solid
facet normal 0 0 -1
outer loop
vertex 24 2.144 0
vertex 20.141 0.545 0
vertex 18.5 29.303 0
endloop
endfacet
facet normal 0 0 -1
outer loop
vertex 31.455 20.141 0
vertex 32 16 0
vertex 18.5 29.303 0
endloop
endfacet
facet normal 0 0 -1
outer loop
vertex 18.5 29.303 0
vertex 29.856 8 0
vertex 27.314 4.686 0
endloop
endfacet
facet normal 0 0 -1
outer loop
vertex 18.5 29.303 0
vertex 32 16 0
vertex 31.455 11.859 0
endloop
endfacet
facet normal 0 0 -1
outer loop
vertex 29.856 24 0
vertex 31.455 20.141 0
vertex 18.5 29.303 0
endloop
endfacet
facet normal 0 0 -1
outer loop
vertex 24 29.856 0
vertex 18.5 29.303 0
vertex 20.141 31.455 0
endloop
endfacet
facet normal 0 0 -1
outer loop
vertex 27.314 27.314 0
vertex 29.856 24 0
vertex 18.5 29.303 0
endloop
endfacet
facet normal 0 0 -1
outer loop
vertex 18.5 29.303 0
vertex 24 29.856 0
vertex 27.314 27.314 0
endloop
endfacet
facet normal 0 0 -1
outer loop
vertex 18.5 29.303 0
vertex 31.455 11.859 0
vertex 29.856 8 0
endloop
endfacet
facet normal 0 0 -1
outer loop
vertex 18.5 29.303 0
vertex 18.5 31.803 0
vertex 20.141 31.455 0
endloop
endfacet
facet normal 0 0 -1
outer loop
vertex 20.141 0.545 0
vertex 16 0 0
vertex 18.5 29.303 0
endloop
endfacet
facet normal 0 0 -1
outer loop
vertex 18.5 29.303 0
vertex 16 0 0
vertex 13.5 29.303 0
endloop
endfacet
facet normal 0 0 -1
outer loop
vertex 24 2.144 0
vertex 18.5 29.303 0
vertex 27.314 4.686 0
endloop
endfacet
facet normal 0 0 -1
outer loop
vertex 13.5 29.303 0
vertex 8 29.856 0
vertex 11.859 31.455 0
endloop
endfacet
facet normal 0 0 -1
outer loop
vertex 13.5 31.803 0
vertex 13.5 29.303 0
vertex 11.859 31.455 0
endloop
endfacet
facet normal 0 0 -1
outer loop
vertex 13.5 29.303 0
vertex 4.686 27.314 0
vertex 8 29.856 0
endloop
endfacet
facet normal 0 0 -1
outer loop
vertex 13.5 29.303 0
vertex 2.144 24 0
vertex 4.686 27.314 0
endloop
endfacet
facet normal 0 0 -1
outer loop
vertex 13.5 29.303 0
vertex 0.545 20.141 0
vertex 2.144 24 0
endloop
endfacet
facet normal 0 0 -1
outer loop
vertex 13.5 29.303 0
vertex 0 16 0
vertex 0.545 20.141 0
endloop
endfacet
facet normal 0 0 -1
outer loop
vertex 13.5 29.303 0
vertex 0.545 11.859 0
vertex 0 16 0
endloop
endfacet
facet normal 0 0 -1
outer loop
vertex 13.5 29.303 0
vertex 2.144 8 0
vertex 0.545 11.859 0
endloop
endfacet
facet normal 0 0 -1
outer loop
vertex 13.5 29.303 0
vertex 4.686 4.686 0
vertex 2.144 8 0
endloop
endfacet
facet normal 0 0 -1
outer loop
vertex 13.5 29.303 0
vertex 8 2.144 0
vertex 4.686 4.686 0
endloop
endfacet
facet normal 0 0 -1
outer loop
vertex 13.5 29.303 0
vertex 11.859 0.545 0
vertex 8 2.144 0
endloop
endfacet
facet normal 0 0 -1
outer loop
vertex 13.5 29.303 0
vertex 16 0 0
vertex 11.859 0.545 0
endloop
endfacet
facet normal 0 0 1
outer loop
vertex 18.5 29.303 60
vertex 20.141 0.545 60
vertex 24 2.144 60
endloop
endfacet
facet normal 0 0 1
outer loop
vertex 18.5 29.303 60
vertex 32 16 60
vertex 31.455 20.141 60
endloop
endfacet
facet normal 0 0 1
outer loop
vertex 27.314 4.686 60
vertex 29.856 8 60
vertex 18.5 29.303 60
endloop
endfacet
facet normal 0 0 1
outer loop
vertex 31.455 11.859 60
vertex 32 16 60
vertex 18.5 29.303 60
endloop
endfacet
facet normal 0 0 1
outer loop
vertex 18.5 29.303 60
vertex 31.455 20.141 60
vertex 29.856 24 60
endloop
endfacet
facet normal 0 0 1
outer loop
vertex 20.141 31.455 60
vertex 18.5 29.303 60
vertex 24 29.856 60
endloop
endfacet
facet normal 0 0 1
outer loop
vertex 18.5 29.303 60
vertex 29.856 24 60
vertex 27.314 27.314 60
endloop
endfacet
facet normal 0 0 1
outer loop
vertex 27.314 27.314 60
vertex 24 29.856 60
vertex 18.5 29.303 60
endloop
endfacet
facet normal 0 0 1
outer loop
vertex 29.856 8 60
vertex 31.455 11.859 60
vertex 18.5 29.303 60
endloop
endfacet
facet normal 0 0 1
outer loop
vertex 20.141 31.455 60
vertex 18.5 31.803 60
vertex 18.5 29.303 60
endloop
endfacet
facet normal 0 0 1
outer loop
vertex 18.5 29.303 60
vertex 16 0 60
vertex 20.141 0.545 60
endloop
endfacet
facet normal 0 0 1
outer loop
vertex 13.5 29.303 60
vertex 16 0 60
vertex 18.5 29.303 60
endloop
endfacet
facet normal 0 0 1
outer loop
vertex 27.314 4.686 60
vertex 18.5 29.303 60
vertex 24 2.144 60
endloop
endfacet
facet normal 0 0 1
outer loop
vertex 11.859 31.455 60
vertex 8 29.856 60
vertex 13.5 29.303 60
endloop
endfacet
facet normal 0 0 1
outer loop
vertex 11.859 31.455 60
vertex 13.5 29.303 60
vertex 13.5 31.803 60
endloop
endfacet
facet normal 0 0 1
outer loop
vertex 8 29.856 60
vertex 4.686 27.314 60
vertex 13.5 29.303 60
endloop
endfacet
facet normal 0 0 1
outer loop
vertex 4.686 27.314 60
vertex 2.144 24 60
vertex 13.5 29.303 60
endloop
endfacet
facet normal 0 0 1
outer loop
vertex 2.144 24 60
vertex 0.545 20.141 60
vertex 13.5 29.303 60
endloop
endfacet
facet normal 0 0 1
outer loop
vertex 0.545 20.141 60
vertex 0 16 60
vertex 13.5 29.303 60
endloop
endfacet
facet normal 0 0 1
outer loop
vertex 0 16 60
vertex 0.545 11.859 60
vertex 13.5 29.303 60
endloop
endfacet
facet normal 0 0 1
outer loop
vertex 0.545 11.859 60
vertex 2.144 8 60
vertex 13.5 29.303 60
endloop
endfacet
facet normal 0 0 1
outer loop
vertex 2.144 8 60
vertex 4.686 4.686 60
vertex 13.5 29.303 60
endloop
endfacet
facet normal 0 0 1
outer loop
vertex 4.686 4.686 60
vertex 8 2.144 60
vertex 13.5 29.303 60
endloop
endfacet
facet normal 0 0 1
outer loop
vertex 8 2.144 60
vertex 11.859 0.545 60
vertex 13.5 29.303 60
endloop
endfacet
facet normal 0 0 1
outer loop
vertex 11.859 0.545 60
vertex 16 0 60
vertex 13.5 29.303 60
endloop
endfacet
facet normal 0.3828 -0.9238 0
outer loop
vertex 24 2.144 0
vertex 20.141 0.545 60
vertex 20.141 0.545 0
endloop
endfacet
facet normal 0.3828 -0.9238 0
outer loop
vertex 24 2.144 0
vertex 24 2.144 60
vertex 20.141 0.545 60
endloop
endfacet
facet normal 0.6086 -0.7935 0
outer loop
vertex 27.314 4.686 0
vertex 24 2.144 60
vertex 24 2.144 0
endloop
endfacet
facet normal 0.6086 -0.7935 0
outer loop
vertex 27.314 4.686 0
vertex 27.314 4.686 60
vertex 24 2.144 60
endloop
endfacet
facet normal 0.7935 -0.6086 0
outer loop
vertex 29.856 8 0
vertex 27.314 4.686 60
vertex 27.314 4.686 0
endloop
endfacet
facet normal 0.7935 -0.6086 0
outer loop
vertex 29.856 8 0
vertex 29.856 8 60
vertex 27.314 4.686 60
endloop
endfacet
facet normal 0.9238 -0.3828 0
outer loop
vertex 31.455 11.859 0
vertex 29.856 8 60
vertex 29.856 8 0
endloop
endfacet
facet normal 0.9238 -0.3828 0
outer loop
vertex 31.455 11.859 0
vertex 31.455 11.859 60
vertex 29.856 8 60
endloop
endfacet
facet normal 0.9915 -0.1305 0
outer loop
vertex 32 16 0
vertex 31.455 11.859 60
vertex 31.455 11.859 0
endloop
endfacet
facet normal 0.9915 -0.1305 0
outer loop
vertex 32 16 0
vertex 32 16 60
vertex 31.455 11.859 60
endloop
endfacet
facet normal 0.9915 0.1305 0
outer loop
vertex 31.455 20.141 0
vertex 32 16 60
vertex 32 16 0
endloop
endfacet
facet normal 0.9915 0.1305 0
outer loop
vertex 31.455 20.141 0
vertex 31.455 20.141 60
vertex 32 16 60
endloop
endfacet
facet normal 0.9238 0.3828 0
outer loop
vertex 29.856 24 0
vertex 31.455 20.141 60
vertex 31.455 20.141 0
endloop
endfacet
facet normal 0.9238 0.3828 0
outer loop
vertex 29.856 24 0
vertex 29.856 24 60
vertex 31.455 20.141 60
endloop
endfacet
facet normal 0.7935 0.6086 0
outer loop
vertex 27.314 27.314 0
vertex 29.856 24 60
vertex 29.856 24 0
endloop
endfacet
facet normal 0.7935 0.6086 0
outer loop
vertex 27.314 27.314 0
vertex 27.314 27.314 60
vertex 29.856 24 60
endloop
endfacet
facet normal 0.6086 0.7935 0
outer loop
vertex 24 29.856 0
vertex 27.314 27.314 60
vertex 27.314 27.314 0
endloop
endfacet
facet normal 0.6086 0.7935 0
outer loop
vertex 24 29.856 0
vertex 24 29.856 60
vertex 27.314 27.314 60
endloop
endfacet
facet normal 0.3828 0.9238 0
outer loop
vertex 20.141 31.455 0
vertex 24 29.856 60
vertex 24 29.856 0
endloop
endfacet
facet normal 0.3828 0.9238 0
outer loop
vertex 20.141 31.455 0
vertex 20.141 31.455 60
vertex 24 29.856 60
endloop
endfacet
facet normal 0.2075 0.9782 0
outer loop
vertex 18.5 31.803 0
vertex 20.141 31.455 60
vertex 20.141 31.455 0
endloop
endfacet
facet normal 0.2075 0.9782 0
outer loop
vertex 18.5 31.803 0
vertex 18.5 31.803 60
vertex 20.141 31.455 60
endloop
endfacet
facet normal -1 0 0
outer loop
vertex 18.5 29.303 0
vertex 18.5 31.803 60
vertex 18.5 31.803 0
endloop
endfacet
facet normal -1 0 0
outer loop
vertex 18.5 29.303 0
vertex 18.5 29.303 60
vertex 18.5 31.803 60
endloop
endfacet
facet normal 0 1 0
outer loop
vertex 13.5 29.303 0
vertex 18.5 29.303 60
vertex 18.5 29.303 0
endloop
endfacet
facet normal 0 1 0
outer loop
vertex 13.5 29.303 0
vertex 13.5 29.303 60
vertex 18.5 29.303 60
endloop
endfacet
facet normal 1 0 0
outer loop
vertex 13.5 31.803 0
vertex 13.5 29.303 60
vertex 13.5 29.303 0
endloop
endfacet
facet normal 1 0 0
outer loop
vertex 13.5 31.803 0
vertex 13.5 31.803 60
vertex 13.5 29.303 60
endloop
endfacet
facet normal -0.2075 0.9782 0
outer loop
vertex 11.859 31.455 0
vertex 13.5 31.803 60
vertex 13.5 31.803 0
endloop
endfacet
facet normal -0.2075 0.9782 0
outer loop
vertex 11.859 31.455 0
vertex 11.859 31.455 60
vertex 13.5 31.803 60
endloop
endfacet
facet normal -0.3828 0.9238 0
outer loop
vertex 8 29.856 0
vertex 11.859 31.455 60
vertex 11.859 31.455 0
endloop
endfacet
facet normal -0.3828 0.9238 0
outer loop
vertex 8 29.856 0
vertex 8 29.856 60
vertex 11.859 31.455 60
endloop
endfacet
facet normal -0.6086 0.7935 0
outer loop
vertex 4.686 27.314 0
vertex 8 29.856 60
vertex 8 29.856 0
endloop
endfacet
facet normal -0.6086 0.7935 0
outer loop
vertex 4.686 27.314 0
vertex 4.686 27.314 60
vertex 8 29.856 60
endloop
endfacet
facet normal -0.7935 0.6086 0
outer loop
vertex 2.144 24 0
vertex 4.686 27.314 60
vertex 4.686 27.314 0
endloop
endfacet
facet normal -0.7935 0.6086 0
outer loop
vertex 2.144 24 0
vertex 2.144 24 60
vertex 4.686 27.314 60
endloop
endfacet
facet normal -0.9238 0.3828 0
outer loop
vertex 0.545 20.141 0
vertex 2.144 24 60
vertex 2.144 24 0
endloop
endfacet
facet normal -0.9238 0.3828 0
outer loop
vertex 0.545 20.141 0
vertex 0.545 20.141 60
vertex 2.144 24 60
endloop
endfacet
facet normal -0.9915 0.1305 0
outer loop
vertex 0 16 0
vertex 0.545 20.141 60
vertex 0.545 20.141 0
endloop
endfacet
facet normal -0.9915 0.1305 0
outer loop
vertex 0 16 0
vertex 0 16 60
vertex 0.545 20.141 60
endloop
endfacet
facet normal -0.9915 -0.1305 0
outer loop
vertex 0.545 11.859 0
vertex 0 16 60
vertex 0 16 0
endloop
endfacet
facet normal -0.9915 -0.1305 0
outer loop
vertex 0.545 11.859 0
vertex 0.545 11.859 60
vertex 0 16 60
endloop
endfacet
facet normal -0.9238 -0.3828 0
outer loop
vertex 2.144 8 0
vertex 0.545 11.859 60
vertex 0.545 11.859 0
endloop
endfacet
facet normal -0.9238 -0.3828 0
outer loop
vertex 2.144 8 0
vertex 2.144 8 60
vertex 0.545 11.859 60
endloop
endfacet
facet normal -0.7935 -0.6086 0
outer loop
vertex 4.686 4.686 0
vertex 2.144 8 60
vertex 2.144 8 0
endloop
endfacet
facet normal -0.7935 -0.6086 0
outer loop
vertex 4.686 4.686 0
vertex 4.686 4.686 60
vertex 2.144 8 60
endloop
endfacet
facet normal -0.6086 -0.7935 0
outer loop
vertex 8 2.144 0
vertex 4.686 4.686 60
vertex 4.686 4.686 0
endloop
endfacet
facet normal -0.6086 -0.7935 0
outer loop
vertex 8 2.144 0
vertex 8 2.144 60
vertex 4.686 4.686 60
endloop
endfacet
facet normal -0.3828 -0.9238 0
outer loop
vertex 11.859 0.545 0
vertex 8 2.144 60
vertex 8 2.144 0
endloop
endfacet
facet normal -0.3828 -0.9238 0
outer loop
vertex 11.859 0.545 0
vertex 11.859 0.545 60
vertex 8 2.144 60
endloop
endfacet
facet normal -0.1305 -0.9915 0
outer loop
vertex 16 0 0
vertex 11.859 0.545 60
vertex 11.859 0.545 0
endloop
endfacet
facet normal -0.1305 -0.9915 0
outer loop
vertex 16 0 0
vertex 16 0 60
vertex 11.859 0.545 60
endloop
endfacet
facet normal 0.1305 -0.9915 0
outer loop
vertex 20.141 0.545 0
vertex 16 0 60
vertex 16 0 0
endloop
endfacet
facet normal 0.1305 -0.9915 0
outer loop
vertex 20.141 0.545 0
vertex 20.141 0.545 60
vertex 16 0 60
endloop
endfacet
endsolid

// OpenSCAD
$fn = 32;

// ----------------------------------------------------------------------
// Keyway shaft: d32 shaft, key 5 x 2.5 mm
// ----------------------------------------------------------------------

// --- parameters (mm) ---
shaft_r = 16;             // shaft radius
key_w = 5;                // keyway width
key_d = 2.5;              // keyway depth below the surface line
plate_t = 60;             // shaft length, Z (extrusion height)
fit_tol = 0.05;           // declared fit tolerance (prompt contract)
free_tol = 0.3;           // declared free tolerance (prompt contract)

shaft_d = 2 * shaft_r;  // shaft diameter
circle_step = 15;  // polygon sampling step, degrees

profile = [[11.859, 31.455], [8, 29.856], [4.686, 27.314], [2.144, 24], [0.545, 20.141], [0, 16], [0.545, 11.859], [2.144, 8], [4.686, 4.686], [8, 2.144], [11.859, 0.545], [16, 0], [20.141, 0.545], [24, 2.144], [27.314, 4.686], [29.856, 8], [31.455, 11.859], [32, 16], [31.455, 20.141], [29.856, 24], [27.314, 27.314], [24, 29.856], [20.141, 31.455], [18.5, 31.803], [18.5, 29.303], [13.5, 29.303], [13.5, 31.803]];  // primary outline, 27 points, counter clockwise

// --- the one profile operation ---
linear_extrude(height = plate_t) polygon(points = profile);
